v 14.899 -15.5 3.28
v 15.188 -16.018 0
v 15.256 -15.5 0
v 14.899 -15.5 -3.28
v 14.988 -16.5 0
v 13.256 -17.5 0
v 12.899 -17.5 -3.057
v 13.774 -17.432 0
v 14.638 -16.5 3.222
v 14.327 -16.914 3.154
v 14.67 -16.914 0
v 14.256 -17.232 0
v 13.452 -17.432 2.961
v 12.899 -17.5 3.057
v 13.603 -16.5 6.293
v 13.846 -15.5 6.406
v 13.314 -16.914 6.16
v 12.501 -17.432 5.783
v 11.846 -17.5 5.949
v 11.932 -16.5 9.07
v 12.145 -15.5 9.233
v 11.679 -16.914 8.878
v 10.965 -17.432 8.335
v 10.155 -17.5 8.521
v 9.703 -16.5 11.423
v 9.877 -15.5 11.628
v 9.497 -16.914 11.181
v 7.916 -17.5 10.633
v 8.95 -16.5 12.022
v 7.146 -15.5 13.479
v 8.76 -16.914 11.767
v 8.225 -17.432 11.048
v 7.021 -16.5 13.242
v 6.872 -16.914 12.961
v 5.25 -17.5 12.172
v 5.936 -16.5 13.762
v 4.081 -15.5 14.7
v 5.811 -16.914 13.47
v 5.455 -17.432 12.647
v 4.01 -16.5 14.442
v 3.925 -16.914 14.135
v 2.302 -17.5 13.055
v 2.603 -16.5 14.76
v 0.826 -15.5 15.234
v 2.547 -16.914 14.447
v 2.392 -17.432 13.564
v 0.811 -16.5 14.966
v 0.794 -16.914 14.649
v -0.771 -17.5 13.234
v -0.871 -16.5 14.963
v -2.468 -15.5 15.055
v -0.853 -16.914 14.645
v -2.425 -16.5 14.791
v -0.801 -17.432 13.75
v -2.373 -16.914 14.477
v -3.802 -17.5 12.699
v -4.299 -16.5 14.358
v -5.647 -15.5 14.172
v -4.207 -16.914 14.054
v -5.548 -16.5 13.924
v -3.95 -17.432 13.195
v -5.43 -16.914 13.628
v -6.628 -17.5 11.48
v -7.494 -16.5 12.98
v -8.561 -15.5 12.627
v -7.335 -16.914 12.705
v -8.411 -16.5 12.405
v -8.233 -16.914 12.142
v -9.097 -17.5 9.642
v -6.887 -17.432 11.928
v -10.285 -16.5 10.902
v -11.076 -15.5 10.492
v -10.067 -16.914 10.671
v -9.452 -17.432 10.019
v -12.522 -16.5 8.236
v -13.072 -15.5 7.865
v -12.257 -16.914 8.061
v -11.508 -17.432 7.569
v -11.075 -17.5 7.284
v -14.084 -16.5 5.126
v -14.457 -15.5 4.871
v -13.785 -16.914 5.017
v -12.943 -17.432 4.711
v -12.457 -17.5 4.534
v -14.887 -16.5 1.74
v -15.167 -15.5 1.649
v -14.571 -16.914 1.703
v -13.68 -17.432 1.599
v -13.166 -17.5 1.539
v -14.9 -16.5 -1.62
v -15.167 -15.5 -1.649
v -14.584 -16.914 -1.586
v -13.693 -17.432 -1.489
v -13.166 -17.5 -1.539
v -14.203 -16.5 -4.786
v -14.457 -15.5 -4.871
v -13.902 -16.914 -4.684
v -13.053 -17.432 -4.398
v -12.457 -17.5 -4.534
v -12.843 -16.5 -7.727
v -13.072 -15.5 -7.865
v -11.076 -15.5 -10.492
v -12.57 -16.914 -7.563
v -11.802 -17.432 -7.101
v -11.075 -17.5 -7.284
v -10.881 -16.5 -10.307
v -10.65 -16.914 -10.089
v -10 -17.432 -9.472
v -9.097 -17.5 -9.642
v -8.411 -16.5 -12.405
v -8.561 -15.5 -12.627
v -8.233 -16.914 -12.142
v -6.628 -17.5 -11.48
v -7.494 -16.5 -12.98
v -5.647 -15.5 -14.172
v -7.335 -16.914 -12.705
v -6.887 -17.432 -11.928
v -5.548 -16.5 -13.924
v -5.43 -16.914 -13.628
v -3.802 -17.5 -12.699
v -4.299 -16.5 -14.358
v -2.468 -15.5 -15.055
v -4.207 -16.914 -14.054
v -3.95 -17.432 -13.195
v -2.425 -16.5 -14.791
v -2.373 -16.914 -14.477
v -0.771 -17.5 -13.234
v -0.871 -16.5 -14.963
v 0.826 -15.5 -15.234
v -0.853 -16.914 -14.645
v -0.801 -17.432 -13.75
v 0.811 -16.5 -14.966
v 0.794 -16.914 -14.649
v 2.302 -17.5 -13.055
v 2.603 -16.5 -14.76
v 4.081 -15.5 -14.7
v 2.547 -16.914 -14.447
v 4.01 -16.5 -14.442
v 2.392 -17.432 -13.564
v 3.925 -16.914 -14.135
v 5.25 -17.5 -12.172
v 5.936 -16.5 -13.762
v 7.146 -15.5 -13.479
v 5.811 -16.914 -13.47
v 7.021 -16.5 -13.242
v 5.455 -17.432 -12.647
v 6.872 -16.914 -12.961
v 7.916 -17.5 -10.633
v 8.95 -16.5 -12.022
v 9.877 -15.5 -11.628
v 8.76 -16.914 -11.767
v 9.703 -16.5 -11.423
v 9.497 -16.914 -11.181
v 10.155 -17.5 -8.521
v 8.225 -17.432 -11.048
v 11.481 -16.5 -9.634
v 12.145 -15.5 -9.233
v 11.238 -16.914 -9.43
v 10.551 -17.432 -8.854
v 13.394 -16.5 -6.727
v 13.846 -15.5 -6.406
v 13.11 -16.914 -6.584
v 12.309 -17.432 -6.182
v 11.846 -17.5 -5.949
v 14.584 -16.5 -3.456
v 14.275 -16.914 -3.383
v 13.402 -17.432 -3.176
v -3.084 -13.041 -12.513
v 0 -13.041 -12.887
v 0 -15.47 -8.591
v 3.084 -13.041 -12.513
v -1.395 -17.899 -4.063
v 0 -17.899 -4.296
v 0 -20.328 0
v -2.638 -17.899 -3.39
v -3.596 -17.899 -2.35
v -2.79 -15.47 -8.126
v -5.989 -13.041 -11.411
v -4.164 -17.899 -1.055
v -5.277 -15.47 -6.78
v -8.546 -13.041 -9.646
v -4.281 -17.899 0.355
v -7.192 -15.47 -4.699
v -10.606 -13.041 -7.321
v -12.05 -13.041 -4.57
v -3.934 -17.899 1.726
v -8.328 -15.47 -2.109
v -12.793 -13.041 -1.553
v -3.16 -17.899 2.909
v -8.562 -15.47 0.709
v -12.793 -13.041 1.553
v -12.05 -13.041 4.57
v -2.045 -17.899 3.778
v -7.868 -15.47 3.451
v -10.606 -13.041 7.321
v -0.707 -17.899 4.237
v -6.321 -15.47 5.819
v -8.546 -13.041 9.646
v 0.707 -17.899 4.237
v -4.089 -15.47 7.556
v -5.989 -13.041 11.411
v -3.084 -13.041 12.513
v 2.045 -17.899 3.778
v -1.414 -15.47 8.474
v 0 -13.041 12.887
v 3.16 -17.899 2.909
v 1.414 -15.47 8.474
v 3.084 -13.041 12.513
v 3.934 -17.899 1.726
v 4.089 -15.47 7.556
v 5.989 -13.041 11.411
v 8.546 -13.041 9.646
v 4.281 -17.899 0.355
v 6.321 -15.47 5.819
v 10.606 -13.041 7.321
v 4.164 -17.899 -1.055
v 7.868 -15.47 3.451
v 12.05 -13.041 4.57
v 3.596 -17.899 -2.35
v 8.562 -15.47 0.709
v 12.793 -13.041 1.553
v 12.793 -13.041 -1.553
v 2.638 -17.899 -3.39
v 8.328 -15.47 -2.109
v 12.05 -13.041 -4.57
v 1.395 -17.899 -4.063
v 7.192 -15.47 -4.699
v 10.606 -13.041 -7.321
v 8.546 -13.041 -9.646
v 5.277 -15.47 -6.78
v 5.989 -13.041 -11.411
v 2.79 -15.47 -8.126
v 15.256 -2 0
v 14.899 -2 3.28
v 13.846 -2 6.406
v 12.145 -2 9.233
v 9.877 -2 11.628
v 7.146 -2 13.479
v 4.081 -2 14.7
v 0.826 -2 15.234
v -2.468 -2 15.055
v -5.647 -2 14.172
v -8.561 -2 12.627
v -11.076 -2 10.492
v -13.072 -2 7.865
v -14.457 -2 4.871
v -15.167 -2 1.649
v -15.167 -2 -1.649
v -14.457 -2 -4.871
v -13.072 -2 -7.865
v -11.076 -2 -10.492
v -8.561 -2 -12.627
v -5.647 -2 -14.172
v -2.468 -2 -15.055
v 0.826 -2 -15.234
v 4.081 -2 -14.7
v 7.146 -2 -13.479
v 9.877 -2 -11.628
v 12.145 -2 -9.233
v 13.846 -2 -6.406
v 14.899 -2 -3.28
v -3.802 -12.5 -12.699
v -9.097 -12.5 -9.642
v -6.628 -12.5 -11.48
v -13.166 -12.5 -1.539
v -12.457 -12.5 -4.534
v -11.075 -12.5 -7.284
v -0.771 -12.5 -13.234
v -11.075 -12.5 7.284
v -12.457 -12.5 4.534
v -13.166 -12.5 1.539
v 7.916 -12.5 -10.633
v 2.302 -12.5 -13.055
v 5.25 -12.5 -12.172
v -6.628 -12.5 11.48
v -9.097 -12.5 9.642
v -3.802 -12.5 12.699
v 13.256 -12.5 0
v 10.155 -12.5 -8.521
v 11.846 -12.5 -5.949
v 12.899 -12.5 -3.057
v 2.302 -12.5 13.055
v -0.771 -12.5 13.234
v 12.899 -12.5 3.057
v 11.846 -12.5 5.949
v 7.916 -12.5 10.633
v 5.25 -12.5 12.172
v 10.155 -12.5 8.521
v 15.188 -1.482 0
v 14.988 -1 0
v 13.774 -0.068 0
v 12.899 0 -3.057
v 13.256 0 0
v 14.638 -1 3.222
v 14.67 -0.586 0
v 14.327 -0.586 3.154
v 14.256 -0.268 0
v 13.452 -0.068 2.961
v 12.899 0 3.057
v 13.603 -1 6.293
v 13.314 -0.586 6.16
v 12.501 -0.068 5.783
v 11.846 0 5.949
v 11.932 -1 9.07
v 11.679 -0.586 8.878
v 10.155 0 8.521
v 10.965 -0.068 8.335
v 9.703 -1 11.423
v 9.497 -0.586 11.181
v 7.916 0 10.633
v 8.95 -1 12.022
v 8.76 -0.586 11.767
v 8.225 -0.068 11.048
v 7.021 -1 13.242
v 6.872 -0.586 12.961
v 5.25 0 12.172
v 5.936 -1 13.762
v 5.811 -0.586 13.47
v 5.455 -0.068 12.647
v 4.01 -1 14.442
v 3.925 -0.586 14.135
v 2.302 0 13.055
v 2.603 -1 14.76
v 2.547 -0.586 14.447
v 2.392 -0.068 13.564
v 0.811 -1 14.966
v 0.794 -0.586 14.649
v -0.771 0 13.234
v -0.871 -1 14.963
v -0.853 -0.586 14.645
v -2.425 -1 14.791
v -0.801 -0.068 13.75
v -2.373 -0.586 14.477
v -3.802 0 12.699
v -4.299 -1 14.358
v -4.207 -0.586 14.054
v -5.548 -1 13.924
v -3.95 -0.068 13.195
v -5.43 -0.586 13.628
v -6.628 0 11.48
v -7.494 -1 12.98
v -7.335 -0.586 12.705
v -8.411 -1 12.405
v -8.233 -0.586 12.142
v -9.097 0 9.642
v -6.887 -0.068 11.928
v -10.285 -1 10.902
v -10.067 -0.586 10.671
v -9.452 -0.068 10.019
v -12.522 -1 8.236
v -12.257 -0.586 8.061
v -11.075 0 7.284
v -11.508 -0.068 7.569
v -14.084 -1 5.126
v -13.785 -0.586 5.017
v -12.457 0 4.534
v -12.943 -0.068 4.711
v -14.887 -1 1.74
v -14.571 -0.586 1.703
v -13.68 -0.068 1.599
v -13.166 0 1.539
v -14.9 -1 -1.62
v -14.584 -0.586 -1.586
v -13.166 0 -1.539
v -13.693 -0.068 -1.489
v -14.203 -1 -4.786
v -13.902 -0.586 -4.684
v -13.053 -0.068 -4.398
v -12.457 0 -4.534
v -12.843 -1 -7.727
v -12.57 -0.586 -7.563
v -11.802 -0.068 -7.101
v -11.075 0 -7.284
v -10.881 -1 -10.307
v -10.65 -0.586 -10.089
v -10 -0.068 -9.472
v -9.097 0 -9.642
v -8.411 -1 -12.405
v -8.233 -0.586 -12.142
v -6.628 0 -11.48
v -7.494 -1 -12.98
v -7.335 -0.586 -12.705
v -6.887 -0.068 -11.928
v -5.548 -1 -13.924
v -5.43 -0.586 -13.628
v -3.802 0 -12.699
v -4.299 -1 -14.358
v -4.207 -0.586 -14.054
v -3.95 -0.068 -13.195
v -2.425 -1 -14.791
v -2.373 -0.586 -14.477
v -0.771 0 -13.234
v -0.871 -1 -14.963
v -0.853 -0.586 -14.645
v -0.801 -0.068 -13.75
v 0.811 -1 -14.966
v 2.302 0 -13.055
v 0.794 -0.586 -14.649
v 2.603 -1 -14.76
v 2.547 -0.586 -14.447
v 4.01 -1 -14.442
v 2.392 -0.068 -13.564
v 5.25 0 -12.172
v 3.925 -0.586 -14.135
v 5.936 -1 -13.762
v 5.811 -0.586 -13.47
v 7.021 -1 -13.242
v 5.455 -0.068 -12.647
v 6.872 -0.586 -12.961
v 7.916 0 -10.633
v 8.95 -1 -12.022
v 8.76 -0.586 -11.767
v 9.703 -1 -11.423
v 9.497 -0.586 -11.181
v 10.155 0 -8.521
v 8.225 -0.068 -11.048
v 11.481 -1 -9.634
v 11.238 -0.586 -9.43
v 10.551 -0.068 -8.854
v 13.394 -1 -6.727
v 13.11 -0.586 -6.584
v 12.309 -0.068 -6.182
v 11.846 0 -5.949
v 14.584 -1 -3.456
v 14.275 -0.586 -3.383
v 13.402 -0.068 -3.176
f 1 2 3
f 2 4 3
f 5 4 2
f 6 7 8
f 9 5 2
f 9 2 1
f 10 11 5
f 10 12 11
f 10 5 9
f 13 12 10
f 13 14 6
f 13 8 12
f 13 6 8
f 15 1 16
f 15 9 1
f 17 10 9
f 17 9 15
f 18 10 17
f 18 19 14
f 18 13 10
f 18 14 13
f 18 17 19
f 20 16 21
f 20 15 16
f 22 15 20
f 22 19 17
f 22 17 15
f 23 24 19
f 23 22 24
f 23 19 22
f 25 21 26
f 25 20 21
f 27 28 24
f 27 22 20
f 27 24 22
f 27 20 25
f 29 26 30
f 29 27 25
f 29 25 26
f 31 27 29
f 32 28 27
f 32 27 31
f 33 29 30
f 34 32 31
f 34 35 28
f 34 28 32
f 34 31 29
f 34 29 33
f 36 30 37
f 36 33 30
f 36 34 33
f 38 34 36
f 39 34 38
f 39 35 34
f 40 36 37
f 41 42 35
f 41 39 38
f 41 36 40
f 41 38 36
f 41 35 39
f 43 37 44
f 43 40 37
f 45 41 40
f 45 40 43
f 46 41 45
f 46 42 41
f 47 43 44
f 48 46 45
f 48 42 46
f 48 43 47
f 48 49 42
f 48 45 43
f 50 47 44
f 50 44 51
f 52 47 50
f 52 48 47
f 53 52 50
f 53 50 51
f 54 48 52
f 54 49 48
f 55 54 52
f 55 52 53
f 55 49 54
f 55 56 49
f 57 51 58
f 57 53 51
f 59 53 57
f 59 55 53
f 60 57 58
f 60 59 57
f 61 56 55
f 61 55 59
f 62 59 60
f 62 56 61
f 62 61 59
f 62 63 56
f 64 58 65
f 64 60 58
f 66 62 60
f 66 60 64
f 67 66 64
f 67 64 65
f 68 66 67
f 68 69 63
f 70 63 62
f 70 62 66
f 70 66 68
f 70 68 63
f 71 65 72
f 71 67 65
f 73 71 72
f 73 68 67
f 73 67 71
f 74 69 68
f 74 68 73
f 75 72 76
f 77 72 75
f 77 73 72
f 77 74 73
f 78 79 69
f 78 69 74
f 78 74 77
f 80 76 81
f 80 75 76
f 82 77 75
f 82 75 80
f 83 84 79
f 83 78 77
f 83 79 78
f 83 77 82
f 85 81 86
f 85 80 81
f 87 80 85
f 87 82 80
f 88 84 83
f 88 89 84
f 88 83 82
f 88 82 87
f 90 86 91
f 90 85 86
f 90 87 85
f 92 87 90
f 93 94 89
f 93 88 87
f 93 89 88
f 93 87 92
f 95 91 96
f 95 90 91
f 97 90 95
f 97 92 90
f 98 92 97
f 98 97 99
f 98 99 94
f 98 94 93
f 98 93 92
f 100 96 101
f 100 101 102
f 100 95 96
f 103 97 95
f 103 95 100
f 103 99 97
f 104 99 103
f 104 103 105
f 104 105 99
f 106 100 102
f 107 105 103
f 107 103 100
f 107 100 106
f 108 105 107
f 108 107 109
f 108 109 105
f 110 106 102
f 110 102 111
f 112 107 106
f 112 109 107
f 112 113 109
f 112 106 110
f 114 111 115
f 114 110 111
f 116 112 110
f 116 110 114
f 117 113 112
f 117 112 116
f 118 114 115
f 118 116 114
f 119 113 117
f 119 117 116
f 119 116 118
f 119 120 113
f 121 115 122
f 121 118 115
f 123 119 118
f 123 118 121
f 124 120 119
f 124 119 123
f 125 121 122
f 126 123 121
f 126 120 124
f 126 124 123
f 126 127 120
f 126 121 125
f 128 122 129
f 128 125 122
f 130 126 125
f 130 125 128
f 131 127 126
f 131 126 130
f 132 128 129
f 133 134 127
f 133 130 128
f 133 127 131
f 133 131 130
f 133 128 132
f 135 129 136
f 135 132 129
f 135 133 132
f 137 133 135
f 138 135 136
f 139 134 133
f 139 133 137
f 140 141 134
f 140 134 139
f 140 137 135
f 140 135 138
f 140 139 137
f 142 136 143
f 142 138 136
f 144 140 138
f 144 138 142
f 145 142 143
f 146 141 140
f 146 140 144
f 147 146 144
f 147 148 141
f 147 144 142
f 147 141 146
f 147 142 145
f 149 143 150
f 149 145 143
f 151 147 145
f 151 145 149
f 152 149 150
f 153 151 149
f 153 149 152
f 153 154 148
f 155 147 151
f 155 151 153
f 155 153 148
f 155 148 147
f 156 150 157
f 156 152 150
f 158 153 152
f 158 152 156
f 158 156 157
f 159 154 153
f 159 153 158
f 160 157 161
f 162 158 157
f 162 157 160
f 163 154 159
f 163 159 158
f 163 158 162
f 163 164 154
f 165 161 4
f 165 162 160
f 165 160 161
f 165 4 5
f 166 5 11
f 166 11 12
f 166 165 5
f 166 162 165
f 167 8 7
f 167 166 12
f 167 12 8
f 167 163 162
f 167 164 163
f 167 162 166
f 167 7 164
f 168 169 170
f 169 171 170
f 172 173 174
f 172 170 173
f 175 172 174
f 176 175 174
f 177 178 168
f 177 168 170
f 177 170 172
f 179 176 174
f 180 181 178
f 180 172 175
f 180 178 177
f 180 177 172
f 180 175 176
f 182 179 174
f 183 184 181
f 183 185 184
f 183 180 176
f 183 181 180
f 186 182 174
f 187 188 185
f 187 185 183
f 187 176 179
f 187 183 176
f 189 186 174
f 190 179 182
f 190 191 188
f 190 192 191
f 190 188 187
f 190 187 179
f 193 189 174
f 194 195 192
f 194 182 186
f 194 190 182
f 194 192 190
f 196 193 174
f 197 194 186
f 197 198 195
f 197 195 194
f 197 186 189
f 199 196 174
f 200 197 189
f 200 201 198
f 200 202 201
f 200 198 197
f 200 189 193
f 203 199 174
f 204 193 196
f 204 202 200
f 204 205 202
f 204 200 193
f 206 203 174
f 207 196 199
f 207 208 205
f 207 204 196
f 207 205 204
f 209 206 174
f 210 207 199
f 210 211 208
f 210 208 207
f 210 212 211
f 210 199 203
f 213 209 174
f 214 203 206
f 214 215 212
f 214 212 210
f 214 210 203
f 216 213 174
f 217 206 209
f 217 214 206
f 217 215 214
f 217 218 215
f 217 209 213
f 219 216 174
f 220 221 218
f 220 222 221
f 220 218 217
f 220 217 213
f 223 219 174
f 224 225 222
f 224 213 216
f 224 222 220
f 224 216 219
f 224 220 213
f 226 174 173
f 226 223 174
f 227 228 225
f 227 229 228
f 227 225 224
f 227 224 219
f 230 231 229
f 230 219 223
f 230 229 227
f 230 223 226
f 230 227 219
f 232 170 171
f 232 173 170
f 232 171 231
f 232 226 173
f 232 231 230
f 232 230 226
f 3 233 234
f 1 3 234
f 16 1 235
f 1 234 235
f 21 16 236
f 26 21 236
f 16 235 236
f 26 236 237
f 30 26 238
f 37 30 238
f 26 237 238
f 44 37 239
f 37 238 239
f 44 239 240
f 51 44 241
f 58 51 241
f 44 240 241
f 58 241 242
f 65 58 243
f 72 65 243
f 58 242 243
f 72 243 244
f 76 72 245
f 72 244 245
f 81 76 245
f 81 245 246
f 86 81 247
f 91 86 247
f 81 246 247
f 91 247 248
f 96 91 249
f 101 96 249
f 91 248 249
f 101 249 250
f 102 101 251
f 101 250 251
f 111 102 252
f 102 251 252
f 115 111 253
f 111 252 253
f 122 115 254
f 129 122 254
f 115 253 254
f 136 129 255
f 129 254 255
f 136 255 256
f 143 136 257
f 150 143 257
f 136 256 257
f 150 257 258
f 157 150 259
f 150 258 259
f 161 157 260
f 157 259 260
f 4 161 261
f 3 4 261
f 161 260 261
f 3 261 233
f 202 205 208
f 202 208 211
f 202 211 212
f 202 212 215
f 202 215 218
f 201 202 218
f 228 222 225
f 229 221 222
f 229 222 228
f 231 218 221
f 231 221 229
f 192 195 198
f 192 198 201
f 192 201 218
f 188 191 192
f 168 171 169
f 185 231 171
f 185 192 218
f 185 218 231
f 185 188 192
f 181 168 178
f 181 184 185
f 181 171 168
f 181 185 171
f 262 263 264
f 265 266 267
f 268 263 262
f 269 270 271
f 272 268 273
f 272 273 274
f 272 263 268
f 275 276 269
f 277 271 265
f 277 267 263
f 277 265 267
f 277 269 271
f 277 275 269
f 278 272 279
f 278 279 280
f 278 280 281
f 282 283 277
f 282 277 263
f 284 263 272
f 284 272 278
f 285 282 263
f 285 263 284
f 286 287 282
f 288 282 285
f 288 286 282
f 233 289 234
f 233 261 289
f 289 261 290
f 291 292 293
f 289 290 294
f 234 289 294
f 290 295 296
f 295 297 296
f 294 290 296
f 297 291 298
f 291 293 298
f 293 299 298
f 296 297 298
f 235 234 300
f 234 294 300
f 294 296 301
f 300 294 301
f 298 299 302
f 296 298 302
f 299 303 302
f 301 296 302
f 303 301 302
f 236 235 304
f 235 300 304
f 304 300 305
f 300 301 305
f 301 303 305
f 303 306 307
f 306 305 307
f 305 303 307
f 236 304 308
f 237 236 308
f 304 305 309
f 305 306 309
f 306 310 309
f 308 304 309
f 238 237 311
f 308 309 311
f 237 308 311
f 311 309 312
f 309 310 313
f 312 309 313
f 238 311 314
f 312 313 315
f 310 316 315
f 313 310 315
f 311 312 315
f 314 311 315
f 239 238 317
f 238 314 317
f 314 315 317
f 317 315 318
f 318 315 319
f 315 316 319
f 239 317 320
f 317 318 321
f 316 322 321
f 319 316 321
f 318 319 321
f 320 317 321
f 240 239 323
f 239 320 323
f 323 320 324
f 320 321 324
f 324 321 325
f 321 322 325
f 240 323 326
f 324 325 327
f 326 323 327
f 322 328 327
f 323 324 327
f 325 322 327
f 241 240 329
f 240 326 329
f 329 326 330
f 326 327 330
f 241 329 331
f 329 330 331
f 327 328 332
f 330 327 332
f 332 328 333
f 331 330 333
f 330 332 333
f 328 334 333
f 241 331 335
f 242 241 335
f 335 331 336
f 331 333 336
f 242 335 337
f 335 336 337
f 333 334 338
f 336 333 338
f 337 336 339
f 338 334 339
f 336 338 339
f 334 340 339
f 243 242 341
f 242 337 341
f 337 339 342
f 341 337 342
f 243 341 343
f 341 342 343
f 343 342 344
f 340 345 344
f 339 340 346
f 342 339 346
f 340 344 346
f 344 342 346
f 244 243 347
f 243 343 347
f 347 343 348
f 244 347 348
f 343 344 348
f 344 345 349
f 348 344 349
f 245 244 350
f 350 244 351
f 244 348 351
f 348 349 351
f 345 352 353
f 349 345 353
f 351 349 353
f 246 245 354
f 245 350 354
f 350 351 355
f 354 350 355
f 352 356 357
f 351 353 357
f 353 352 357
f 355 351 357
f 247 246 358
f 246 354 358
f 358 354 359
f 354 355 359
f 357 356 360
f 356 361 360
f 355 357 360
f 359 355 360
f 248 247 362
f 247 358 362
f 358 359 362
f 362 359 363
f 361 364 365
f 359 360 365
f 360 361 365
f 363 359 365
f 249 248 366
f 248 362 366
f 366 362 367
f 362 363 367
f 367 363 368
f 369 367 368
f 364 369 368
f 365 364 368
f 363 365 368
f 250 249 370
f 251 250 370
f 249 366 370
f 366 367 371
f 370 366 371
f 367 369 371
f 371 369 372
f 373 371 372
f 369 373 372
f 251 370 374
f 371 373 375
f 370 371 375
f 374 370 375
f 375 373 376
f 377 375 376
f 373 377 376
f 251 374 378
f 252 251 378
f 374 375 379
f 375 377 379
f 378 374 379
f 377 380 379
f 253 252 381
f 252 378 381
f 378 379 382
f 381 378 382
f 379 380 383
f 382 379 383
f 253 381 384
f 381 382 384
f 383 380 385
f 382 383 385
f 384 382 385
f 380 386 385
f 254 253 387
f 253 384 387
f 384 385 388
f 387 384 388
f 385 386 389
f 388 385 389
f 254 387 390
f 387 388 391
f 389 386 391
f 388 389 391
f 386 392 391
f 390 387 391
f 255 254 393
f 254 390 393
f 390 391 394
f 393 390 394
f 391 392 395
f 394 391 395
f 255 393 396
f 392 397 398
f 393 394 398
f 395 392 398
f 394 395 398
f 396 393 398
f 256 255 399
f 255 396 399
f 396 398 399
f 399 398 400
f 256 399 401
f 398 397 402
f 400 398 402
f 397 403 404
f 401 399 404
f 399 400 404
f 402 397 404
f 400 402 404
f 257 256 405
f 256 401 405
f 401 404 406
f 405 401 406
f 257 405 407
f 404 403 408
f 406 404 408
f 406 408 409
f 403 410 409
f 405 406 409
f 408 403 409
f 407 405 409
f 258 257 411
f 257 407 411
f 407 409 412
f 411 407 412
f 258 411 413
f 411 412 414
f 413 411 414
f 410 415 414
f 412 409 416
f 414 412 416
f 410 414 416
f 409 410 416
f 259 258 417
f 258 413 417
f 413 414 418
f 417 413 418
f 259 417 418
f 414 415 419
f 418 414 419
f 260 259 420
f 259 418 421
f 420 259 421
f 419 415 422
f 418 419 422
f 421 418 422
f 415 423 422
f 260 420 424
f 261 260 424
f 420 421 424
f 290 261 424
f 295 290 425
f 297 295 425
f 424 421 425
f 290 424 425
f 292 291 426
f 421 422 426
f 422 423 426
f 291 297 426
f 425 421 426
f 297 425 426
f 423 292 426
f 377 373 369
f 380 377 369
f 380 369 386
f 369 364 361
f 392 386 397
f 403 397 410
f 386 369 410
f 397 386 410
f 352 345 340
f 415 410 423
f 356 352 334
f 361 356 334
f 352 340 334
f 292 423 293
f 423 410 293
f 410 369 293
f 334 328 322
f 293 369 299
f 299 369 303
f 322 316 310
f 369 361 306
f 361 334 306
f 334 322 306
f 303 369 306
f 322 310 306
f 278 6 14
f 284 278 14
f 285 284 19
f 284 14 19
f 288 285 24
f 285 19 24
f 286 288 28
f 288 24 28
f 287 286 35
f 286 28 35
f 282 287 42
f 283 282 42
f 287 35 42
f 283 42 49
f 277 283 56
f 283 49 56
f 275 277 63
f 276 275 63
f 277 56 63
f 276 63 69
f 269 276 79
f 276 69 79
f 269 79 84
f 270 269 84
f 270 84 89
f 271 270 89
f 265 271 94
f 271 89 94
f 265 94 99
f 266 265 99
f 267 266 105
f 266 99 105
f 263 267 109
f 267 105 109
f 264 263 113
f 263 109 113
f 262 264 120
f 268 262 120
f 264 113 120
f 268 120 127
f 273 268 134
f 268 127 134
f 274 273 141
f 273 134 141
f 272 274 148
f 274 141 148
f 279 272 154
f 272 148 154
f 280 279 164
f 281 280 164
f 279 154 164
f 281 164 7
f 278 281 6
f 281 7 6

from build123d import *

# Parameters (mm, degrees)
F0_R      = 15.255971
F1_DEPTH  = 17.5
F2_R      = 2
F1_FACE_R = 13.255971
F3_DEPTH  = 5


with BuildPart() as f1:
    # F0 (on Front) → F1 (new body)
    with BuildSketch(Plane.XZ):
        Circle(F0_R)
    extrude(amount=F1_DEPTH)

    # F2
    f2_edges = [f1.edges().sort_by_distance(p)[0] for p in [
        (-15.255971, -17.5, 0),
        (-15.255971, 0, 0),
    ]]
    fillet(f2_edges, radius=F2_R)

    # F1_face (on face) → F3 (cut)
    with BuildSketch(Plane.XZ.offset(17.5)):
        Circle(F1_FACE_R)
    extrude(amount=-F3_DEPTH, mode=Mode.SUBTRACT)


with BuildPart() as f6:
    # F5 (on Right) → F6 (revolve)
    with BuildSketch(Plane.YZ):
        Polygon((-13.040973, -12.887048), (-13.040973, 0), (-20.327732, 0), align=None)
    revolve(axis=Axis((0, -16.684352, 0), (0, 1, 0)))


solid = Compound([f1.part, f6.part])
